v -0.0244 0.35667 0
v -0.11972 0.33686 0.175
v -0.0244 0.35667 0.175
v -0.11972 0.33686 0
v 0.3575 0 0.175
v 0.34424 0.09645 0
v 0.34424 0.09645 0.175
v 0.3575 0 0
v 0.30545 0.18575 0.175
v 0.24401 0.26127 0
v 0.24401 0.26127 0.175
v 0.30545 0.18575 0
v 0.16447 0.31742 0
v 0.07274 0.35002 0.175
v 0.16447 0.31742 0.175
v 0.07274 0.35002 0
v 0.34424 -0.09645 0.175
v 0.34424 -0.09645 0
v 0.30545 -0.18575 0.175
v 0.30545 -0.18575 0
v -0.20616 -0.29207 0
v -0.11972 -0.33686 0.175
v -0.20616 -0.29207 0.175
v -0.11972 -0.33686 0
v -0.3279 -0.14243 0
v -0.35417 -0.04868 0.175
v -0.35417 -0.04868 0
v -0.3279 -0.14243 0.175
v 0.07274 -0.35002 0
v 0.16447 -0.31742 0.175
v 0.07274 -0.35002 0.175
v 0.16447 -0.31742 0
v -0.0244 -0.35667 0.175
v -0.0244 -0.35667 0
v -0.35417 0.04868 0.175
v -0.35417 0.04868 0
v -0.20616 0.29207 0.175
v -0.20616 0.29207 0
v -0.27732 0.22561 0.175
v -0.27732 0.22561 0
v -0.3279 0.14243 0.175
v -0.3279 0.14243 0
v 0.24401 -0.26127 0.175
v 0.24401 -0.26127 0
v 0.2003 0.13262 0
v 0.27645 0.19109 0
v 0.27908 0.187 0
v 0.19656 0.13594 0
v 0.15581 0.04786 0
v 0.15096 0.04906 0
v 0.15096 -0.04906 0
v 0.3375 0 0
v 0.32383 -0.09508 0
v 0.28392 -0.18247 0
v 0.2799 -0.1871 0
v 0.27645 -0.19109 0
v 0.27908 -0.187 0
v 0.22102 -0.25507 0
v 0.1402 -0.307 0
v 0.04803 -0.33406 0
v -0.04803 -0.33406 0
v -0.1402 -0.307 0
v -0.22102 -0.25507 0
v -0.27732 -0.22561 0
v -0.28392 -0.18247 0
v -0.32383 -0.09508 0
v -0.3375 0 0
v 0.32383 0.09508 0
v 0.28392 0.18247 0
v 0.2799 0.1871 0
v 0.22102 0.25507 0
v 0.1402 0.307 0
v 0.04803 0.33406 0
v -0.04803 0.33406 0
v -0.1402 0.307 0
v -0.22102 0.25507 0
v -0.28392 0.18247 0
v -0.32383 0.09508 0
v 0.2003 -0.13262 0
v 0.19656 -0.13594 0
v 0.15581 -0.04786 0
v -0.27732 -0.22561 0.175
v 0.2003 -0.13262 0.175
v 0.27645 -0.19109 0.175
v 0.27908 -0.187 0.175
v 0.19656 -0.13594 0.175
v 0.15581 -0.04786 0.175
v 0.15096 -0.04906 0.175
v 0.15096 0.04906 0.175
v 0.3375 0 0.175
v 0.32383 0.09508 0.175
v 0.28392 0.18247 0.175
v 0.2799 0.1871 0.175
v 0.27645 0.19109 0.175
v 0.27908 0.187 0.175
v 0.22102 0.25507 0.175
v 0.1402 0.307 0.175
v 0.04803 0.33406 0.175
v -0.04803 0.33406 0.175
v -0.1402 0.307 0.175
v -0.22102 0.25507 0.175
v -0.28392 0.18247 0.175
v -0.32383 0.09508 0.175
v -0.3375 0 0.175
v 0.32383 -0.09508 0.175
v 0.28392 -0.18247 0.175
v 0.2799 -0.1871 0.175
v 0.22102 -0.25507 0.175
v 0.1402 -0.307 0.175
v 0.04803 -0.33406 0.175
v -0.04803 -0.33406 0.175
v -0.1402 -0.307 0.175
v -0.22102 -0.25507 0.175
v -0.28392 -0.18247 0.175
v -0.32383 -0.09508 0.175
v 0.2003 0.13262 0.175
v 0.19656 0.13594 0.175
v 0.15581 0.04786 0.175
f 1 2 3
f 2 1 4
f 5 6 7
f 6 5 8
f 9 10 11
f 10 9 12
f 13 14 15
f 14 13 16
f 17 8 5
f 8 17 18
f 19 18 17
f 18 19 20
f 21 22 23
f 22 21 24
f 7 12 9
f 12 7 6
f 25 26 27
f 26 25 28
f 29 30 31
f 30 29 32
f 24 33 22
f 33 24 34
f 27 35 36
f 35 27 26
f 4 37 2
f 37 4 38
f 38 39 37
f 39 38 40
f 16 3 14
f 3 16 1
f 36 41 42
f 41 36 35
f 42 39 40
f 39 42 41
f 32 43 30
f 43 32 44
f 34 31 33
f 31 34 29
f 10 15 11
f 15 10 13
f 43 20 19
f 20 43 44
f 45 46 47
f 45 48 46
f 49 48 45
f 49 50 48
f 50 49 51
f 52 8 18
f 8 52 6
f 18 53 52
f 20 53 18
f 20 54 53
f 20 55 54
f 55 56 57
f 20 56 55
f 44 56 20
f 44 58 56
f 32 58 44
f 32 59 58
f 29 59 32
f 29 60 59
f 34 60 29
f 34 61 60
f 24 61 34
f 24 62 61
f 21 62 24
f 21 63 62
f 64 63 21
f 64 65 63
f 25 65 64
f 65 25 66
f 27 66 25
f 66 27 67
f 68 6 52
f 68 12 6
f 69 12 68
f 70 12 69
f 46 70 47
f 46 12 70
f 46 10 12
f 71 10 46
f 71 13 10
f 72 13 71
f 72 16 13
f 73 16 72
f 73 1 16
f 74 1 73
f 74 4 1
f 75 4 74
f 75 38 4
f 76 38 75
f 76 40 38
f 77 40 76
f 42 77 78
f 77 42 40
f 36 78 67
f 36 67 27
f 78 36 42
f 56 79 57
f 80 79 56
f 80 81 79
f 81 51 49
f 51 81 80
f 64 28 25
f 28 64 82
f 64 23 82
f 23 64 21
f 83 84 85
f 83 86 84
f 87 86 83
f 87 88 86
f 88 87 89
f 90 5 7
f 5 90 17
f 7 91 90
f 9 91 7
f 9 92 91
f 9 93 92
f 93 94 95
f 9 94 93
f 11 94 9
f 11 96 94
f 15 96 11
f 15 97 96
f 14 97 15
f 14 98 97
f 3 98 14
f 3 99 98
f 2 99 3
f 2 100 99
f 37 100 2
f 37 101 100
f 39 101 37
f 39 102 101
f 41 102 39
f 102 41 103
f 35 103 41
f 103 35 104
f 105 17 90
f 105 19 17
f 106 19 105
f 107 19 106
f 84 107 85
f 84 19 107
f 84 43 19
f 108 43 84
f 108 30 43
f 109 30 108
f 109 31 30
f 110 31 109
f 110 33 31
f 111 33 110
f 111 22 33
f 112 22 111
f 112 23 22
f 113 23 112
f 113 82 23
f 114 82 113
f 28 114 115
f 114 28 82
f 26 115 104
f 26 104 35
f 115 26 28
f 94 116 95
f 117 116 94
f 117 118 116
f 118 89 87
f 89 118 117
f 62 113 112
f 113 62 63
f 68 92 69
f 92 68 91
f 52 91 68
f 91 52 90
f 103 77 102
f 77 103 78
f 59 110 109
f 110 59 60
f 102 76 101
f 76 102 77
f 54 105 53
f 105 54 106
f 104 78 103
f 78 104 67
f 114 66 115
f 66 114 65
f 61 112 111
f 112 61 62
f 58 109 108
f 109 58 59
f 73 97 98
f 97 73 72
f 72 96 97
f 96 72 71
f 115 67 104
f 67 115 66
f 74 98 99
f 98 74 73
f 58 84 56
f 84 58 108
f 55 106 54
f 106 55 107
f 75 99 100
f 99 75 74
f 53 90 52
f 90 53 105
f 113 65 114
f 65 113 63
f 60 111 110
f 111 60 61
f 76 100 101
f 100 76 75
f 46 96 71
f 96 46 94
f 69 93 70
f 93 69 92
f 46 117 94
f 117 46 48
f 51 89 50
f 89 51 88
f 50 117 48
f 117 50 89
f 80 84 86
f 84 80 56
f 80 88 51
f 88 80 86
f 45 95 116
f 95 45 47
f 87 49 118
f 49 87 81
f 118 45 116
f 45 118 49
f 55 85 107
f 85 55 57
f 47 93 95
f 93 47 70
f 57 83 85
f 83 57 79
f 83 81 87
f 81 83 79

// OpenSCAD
$vpd=4;
pi=3.14;
effR=4;
inH=3;    inR=3;
outH=3.5; outR=6.75;
schaal=0.05;
module ring(h, r, dik)
{
  difference() {
    cylinder(h=h, r=r+dik);
    translate([0,0,-5])
      cylinder(h=h+10, r=r); // negative object higher
  }
}

module biogas()
{
  scale(v=[schaal,schaal,schaal]) {
    union() {
      ring(outH, outR, 0.4);
      difference() {
        translate([7,0,0])
          ring(outH, effR, 0.1);
        translate([0,0,-5])
          ring(outH+10, outR, 20);
      }
    }
  }
}
biogas();

echo("https://www.hmg-benelux-shop.com/hmg_h/polyester-golfplaat-op-rol-7618-080-mm-naturel-95elpe7618r.html");
